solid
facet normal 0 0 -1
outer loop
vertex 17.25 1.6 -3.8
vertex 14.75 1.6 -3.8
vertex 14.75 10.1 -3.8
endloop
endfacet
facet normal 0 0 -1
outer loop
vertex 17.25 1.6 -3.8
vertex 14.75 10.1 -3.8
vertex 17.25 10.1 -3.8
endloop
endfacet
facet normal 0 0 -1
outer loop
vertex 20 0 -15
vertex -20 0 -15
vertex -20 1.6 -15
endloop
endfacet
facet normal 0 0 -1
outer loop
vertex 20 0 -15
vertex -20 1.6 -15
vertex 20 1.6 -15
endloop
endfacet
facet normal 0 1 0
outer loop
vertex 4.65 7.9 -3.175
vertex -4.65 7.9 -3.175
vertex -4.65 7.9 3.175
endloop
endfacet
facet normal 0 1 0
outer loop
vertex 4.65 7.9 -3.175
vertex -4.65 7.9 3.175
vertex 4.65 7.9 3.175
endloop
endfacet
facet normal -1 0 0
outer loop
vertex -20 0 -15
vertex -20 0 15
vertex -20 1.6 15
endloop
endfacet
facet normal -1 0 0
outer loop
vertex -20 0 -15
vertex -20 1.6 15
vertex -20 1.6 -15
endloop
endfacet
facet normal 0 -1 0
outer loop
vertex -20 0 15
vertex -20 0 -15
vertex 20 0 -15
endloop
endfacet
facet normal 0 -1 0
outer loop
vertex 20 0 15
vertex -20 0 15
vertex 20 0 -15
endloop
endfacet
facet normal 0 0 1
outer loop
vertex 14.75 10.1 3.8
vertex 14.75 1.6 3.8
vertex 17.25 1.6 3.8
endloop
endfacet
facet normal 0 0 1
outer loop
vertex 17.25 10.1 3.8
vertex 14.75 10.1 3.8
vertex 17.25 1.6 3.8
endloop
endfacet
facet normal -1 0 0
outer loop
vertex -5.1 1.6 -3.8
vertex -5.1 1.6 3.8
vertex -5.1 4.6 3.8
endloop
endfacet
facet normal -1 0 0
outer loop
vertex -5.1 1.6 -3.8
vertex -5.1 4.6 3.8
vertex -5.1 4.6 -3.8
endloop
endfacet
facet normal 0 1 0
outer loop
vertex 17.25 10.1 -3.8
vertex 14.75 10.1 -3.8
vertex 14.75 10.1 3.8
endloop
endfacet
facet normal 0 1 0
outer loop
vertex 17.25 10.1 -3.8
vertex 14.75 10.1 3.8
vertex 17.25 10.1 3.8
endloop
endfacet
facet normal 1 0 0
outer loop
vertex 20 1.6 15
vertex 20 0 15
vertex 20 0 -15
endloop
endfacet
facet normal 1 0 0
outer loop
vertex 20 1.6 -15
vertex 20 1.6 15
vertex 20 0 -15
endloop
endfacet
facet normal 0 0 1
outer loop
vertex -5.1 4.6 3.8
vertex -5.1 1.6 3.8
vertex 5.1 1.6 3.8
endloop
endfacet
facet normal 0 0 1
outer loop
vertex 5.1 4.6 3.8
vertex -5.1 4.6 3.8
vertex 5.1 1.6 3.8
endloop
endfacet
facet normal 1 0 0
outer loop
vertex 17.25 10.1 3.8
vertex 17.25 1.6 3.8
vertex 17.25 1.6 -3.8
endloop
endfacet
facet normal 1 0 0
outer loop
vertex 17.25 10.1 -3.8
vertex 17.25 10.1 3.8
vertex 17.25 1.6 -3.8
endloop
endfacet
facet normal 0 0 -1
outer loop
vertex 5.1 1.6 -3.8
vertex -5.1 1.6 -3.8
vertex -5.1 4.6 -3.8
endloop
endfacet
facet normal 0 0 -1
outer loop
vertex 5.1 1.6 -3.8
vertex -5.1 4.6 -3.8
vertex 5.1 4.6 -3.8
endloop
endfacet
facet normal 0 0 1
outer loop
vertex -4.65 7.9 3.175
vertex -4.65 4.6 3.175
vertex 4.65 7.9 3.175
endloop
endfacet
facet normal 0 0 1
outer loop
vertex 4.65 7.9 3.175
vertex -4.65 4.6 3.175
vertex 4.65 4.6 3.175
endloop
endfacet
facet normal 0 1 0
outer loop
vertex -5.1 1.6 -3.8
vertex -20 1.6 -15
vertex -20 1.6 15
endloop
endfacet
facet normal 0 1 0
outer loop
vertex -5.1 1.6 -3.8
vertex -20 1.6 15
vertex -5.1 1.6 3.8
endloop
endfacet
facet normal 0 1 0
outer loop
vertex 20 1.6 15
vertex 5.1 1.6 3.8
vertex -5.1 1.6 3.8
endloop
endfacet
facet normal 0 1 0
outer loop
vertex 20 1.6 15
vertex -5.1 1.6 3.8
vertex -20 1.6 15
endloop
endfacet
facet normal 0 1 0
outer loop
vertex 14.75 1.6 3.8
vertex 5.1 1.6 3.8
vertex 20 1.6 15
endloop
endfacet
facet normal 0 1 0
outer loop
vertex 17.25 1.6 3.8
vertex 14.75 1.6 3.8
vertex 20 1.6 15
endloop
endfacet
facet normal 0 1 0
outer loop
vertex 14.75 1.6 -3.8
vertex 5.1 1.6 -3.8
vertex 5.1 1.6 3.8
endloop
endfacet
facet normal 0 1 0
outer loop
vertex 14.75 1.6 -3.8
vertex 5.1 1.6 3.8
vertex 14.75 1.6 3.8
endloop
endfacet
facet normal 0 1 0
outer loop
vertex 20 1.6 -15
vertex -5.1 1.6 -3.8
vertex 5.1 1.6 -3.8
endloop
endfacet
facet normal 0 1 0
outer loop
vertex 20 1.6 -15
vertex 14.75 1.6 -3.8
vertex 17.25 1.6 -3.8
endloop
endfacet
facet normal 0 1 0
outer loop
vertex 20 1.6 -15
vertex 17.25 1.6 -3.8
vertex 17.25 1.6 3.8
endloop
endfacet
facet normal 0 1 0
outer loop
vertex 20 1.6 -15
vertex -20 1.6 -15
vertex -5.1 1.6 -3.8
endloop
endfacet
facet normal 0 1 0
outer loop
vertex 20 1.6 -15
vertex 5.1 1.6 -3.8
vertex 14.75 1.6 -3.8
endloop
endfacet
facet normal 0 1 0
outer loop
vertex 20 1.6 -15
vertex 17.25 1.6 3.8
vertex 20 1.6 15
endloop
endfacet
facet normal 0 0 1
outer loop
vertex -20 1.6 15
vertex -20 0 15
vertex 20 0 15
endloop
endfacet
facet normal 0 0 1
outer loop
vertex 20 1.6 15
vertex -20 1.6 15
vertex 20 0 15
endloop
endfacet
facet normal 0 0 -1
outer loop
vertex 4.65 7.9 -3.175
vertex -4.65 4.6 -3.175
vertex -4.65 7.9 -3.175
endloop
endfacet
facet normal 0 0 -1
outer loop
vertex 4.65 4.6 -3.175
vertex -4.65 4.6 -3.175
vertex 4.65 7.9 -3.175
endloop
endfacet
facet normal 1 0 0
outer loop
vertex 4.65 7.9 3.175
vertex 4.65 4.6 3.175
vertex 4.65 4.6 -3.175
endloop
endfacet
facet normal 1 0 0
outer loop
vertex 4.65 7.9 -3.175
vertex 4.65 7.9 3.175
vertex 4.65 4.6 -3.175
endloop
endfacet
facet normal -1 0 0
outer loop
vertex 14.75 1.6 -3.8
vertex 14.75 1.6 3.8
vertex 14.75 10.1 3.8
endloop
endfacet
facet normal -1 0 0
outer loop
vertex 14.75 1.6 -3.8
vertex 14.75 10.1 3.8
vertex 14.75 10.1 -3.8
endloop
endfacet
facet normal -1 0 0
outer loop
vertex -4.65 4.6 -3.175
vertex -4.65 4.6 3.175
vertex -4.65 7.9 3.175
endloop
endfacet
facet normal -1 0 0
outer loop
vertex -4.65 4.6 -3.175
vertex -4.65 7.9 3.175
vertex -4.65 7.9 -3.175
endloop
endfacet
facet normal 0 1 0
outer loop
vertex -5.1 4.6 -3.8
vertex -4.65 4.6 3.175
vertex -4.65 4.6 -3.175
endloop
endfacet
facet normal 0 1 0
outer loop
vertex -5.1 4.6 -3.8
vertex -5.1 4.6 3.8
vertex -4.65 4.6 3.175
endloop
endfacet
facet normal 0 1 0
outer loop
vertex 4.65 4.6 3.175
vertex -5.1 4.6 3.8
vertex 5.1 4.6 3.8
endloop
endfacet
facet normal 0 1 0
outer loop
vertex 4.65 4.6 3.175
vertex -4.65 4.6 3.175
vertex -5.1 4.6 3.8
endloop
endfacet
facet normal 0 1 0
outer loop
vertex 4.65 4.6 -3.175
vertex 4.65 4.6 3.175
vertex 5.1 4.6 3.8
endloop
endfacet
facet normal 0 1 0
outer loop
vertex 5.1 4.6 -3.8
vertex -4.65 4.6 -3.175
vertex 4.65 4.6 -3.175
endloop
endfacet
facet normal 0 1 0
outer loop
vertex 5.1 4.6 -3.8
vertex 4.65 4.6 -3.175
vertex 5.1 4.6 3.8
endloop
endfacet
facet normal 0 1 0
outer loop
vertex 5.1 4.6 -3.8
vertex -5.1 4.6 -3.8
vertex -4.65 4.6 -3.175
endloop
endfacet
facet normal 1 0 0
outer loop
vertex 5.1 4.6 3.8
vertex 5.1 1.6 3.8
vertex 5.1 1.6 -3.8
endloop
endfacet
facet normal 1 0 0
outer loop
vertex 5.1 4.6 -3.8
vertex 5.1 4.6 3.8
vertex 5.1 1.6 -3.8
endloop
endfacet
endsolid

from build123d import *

# Parameters (mm, degrees)
SKETCH1_W         = 40
SKETCH1_H         = 30
PERFBOARD_DEPTH   = 1.6
DIP8_SOCKET_START = 1.6
SKETCH2_W         = 10.2
SKETCH2_H         = 7.6
DIP8_SOCKET_DEPTH = 3
CA3140_START      = 4.6
SKETCH3_W         = 9.3
SKETCH3_H         = 6.35
CA3140_DEPTH      = 3.3
HEADER_START      = 1.6
SKETCH4_W         = 2.5
SKETCH4_H         = 7.6
HEADER_DEPTH      = 8.5


with BuildPart() as part:
    # Sketch1 → Perfboard (new body)
    with BuildSketch(Plane(origin=(0, 0, 0), x_dir=(1, 0, 0), z_dir=(0, 1, 0))):
        Rectangle(SKETCH1_W, SKETCH1_H)
    extrude(amount=PERFBOARD_DEPTH)

    # Sketch2 → DIP8_Socket (add)
    with BuildSketch(Plane(origin=(0, 0, 0), x_dir=(1, 0, 0), z_dir=(0, 1, 0)).offset(DIP8_SOCKET_START)):
        Rectangle(SKETCH2_W, SKETCH2_H)
    extrude(amount=DIP8_SOCKET_DEPTH)

    # Sketch3 → CA3140 (add)
    with BuildSketch(Plane(origin=(0, 0, 0), x_dir=(1, 0, 0), z_dir=(0, 1, 0)).offset(CA3140_START)):
        Rectangle(SKETCH3_W, SKETCH3_H)
    extrude(amount=CA3140_DEPTH)

    # Sketch4 → Header (add)
    with BuildSketch(Plane(origin=(0, 0, 0), x_dir=(1, 0, 0), z_dir=(0, 1, 0)).offset(HEADER_START)):
        with Locations((16, 0)):
            Rectangle(SKETCH4_W, SKETCH4_H)
    extrude(amount=HEADER_DEPTH)


solid = part.part
